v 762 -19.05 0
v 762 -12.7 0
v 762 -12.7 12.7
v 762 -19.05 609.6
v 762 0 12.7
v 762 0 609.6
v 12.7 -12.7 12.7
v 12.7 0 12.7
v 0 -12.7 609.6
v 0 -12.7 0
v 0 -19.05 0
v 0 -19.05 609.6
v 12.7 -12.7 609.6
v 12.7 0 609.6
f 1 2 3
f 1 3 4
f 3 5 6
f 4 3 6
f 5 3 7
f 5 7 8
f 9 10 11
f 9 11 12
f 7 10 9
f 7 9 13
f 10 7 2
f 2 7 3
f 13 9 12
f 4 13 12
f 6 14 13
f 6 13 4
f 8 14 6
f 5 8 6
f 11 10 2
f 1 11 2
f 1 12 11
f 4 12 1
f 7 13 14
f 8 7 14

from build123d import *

# Parameters (mm, degrees)
F0_W     = 762
F0_H     = 609.6
F1_DEPTH = 19.05
F2_W     = 12.7
F2_H     = 12.7
F3_DEPTH = 762.001
F4_W     = 12.7
F4_H     = 12.7
F5_DEPTH = 609.601


with BuildPart() as f1:
    # F0 (on Front) → F1 (new body)
    with BuildSketch(Plane.XZ):
        with Locations((381, 304.8)):
            Rectangle(F0_W, F0_H)
    extrude(amount=F1_DEPTH)

    # F2 (on face) → F3 (cut, through all)
    with BuildSketch(Plane.YZ.offset(762)):
        with Locations((-6.35, 6.35)):
            Rectangle(F2_W, F2_H)
    extrude(amount=-F3_DEPTH, mode=Mode.SUBTRACT)

    # F4 (on face) → F5 (cut, through all)
    with BuildSketch(Plane.XY.offset(609.6)):
        with Locations((6.35, -6.35)):
            Rectangle(F4_W, F4_H)
    extrude(amount=-F5_DEPTH, mode=Mode.SUBTRACT)


solid = f1.part
